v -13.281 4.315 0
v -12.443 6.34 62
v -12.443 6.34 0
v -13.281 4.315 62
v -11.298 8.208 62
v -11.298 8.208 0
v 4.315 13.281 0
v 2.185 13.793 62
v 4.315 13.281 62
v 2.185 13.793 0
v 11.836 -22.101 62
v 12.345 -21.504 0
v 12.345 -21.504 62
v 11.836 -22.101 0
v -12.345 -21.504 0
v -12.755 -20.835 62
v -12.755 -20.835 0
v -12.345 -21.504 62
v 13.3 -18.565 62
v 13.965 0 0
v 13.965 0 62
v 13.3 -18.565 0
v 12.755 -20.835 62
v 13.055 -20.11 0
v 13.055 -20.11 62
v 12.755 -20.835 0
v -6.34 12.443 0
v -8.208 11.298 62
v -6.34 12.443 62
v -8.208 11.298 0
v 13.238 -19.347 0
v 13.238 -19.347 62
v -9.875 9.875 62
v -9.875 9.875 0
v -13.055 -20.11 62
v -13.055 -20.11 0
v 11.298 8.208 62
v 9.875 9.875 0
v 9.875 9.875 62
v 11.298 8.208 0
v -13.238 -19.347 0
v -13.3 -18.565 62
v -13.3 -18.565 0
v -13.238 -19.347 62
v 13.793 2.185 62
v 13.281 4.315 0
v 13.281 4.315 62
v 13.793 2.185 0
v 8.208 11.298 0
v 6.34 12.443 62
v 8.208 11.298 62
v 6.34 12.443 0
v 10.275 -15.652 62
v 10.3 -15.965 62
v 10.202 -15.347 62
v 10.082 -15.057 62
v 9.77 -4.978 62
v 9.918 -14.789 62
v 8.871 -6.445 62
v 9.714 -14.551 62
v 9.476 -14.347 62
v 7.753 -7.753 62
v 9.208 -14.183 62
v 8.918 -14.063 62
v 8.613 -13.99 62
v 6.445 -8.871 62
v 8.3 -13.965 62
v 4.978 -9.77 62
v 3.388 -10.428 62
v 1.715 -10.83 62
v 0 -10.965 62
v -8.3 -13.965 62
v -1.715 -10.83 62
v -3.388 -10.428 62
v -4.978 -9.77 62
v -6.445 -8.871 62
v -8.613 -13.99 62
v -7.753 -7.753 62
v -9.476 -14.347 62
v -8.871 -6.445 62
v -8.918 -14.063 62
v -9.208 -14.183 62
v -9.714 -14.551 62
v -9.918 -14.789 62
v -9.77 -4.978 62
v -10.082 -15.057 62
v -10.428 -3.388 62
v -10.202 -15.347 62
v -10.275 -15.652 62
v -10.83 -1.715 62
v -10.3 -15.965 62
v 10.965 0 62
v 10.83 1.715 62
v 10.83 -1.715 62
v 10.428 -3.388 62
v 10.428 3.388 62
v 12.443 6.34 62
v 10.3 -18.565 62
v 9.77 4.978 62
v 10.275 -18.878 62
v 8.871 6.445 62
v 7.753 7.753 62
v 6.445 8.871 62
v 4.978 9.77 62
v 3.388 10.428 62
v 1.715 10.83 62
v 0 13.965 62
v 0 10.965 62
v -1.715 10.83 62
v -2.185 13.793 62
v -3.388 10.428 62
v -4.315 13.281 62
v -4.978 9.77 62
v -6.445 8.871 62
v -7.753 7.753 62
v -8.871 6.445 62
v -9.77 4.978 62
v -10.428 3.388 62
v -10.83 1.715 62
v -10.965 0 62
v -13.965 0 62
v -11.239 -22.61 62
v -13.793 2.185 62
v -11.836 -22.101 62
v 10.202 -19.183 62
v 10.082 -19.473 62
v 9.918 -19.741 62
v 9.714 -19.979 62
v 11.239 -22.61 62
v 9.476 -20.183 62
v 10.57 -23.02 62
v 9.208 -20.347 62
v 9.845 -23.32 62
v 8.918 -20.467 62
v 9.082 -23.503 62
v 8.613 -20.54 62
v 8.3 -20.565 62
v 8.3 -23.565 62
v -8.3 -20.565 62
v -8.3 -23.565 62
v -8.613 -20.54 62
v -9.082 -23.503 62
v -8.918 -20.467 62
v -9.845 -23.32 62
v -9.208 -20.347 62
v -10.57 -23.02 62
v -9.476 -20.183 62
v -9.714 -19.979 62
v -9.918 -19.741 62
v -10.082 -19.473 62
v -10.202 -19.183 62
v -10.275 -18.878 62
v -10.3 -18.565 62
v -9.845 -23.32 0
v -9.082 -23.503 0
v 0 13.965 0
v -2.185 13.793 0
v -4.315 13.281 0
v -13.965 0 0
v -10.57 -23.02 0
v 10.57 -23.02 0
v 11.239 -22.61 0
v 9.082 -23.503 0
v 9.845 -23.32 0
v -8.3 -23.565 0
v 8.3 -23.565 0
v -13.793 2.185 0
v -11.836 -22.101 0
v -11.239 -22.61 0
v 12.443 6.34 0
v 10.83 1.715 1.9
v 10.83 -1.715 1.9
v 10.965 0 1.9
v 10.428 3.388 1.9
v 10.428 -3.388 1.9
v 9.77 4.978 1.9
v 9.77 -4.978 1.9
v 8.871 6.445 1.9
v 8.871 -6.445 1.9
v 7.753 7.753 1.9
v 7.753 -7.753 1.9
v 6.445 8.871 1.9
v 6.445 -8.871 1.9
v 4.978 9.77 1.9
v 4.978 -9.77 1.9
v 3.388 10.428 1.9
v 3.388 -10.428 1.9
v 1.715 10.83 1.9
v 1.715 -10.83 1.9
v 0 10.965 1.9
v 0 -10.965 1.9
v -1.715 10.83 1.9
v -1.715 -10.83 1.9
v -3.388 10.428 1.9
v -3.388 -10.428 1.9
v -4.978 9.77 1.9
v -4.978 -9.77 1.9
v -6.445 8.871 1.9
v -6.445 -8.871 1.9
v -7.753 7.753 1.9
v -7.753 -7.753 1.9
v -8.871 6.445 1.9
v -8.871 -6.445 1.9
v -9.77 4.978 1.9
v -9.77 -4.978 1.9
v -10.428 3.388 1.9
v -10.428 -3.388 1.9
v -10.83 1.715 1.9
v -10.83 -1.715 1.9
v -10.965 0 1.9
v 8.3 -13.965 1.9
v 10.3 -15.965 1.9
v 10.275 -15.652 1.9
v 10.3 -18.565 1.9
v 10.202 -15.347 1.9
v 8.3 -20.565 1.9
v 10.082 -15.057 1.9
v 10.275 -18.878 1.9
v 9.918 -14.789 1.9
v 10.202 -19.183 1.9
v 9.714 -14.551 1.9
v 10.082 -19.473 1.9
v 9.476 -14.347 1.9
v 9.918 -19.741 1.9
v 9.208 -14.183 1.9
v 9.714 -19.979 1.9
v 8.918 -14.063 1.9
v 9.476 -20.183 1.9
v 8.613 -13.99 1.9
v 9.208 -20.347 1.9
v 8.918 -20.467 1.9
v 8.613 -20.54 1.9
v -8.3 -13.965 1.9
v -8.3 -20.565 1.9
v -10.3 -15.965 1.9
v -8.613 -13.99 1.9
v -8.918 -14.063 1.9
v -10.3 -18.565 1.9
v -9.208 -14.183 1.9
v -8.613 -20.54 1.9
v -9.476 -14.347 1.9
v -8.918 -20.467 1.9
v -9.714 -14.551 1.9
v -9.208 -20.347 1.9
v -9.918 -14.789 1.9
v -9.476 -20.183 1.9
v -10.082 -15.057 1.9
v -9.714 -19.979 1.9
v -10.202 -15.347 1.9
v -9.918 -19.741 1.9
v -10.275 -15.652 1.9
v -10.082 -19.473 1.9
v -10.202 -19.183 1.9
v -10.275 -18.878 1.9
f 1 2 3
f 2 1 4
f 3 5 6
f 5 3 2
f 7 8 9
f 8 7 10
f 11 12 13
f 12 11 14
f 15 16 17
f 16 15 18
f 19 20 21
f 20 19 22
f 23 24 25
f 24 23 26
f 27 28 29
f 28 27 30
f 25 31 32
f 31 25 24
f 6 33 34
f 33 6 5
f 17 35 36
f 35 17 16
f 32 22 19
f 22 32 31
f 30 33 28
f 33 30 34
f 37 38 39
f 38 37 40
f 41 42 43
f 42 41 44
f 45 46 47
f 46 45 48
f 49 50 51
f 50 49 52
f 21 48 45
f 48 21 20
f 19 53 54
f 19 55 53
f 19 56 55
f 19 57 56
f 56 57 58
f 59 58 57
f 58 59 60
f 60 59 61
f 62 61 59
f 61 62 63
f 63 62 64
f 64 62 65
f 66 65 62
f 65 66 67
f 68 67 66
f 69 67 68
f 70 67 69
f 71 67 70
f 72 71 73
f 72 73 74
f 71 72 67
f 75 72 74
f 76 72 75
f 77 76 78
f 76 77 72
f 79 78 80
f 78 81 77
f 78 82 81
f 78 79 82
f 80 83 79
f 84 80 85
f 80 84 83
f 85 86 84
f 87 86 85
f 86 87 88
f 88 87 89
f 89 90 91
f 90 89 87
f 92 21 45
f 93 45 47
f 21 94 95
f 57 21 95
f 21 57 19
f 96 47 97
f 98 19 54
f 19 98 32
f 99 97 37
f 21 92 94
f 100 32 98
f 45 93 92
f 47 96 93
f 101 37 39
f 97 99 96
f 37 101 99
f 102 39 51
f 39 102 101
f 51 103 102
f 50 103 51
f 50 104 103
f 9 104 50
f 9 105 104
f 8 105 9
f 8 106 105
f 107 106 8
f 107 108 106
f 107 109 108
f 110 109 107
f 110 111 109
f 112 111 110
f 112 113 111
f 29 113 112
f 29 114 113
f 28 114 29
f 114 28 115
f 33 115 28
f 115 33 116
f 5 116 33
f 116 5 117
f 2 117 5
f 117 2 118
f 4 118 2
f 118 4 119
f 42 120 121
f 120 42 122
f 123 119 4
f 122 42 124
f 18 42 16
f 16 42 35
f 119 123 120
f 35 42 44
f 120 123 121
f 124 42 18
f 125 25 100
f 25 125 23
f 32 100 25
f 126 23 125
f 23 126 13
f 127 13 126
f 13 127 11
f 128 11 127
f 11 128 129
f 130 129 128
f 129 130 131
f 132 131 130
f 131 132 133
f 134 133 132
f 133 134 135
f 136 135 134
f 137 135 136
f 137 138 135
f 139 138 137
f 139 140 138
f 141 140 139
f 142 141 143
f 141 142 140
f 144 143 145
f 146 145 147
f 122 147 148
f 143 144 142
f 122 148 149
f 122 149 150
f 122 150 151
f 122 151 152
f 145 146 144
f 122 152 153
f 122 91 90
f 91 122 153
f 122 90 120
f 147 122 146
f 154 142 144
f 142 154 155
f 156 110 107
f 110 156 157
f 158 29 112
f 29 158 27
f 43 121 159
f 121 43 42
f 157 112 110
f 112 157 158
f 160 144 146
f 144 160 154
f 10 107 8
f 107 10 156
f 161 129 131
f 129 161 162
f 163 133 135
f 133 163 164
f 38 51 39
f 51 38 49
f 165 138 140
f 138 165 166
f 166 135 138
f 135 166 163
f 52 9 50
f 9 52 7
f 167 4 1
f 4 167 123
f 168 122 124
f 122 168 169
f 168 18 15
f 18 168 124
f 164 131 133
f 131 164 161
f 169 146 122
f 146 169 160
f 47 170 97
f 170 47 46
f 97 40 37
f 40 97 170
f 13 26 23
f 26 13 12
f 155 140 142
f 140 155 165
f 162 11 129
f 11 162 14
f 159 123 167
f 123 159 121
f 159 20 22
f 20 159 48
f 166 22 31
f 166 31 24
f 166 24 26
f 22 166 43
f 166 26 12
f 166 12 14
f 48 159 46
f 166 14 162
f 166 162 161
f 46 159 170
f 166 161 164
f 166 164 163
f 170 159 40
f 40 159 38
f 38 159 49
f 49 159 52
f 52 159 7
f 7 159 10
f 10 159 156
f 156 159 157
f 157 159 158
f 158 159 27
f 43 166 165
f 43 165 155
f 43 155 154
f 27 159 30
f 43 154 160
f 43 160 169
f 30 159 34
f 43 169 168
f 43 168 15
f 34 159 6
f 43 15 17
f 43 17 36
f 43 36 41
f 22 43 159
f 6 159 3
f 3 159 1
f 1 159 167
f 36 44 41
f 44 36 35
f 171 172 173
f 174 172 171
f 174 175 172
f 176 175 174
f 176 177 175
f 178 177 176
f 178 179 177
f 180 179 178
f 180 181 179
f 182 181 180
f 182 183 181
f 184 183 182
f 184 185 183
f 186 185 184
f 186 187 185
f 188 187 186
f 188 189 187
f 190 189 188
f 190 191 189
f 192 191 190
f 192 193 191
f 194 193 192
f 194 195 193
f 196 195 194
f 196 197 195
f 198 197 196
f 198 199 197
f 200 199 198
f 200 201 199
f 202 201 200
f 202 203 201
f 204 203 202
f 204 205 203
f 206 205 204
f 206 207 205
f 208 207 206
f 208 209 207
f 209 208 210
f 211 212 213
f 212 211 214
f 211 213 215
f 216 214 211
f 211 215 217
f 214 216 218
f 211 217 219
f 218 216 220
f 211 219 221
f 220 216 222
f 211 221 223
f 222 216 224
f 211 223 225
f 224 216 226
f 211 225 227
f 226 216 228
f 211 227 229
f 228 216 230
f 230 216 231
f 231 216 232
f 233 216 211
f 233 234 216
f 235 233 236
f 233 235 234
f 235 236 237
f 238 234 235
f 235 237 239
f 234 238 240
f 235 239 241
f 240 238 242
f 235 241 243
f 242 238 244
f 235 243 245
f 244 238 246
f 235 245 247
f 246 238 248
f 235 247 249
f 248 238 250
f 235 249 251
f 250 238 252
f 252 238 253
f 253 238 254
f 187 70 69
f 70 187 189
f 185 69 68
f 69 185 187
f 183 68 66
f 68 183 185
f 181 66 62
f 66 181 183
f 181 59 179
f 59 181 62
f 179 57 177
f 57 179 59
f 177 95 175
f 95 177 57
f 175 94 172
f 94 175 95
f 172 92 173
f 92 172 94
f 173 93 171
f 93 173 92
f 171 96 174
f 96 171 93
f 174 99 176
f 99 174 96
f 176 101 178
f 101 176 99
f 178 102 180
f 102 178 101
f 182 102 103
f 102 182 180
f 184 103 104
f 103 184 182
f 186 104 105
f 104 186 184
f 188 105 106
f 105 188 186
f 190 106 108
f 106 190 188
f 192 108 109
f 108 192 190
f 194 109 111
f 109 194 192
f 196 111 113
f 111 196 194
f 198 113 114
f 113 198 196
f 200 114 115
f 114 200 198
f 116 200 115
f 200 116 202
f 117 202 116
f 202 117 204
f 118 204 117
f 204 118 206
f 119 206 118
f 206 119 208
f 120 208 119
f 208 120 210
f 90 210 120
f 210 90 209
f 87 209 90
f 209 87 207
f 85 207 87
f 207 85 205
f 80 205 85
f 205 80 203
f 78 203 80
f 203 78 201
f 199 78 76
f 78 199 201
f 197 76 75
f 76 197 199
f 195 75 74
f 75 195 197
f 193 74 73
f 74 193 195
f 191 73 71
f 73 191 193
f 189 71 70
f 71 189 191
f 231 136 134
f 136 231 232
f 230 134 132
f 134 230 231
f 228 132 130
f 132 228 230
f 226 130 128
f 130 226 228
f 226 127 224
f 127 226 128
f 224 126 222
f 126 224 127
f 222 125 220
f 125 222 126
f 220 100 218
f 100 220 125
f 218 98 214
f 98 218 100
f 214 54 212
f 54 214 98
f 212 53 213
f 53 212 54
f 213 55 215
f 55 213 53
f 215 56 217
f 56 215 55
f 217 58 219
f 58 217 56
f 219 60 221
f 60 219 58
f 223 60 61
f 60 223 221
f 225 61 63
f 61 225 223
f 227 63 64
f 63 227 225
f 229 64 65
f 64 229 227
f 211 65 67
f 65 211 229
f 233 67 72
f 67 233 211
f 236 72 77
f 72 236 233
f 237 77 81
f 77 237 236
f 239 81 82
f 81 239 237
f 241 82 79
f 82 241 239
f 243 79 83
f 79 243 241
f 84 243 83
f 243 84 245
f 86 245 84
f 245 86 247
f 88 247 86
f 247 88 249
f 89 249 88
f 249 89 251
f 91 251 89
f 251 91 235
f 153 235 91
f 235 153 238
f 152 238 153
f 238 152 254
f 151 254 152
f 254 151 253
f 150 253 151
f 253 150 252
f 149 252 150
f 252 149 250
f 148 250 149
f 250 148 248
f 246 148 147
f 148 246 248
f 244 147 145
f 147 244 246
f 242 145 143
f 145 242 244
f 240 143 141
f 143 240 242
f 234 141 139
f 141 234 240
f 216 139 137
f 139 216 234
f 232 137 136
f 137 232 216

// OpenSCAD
/****************************************************************************
 *   Shutoff Valve Extender by (c) 2019 Marcio Teixeira                     *
 *                                                                          *
 *   This program is free software: you can redistribute it and/or modify   *
 *   it under the terms of the GNU General Public License as published by   *
 *   the Free Software Foundation, either version 3 of the License, or      *
 *   (at your option) any later version.                                    *
 *                                                                          *
 *   This program is distributed in the hope that it will be useful,        *
 *   but WITHOUT ANY WARRANTY; without even the implied warranty of         *
 *   MERCHANTABILITY or FITNESS FOR A PARTICULAR PURPOSE.  See the          *
 *   GNU General Public License for more details.                           *
 *                                                                          *
 *   To view a copy of the GNU General Public License, go to the following  *
 *   location: <http://www.gnu.org/licenses/>.                              *
 ****************************************************************************/

handle_depth  = 6;
handle_width  = 20;
handle_length = 60;

pvc_outer_dia = 21.33;

wall_thickness = 3;
clearance      = 0.3;
cap_height     = 2;

$fn = 40;

module round_rect(dim, center, r=2) {
    w = dim[0];
    h = dim[1];
    hull()
    for(x=[-w/2+r,w/2-r])
    for(y=[-h/2+r,h/2-r])
            translate([x,y])
                circle(r=r);
}

module tool_openings() {
    circle(r = pvc_outer_dia/2+clearance);
    
    translate([0,-pvc_outer_dia/2-handle_depth/2-wall_thickness-clearance*2])
        round_rect([handle_width+clearance*2, handle_depth+clearance*2],center=true);
}

module tool_outer_wall() {
    minkowski() {
        hull()
            tool_openings();
        circle(r = wall_thickness);
    }
}

module tool_shape() {
    difference() {
        linear_extrude(handle_length + cap_height)
            tool_outer_wall();
        translate([0,0,cap_height-0.1])
            linear_extrude(handle_length + cap_height+0.2)
            tool_openings();
    }
}

tool_shape();
